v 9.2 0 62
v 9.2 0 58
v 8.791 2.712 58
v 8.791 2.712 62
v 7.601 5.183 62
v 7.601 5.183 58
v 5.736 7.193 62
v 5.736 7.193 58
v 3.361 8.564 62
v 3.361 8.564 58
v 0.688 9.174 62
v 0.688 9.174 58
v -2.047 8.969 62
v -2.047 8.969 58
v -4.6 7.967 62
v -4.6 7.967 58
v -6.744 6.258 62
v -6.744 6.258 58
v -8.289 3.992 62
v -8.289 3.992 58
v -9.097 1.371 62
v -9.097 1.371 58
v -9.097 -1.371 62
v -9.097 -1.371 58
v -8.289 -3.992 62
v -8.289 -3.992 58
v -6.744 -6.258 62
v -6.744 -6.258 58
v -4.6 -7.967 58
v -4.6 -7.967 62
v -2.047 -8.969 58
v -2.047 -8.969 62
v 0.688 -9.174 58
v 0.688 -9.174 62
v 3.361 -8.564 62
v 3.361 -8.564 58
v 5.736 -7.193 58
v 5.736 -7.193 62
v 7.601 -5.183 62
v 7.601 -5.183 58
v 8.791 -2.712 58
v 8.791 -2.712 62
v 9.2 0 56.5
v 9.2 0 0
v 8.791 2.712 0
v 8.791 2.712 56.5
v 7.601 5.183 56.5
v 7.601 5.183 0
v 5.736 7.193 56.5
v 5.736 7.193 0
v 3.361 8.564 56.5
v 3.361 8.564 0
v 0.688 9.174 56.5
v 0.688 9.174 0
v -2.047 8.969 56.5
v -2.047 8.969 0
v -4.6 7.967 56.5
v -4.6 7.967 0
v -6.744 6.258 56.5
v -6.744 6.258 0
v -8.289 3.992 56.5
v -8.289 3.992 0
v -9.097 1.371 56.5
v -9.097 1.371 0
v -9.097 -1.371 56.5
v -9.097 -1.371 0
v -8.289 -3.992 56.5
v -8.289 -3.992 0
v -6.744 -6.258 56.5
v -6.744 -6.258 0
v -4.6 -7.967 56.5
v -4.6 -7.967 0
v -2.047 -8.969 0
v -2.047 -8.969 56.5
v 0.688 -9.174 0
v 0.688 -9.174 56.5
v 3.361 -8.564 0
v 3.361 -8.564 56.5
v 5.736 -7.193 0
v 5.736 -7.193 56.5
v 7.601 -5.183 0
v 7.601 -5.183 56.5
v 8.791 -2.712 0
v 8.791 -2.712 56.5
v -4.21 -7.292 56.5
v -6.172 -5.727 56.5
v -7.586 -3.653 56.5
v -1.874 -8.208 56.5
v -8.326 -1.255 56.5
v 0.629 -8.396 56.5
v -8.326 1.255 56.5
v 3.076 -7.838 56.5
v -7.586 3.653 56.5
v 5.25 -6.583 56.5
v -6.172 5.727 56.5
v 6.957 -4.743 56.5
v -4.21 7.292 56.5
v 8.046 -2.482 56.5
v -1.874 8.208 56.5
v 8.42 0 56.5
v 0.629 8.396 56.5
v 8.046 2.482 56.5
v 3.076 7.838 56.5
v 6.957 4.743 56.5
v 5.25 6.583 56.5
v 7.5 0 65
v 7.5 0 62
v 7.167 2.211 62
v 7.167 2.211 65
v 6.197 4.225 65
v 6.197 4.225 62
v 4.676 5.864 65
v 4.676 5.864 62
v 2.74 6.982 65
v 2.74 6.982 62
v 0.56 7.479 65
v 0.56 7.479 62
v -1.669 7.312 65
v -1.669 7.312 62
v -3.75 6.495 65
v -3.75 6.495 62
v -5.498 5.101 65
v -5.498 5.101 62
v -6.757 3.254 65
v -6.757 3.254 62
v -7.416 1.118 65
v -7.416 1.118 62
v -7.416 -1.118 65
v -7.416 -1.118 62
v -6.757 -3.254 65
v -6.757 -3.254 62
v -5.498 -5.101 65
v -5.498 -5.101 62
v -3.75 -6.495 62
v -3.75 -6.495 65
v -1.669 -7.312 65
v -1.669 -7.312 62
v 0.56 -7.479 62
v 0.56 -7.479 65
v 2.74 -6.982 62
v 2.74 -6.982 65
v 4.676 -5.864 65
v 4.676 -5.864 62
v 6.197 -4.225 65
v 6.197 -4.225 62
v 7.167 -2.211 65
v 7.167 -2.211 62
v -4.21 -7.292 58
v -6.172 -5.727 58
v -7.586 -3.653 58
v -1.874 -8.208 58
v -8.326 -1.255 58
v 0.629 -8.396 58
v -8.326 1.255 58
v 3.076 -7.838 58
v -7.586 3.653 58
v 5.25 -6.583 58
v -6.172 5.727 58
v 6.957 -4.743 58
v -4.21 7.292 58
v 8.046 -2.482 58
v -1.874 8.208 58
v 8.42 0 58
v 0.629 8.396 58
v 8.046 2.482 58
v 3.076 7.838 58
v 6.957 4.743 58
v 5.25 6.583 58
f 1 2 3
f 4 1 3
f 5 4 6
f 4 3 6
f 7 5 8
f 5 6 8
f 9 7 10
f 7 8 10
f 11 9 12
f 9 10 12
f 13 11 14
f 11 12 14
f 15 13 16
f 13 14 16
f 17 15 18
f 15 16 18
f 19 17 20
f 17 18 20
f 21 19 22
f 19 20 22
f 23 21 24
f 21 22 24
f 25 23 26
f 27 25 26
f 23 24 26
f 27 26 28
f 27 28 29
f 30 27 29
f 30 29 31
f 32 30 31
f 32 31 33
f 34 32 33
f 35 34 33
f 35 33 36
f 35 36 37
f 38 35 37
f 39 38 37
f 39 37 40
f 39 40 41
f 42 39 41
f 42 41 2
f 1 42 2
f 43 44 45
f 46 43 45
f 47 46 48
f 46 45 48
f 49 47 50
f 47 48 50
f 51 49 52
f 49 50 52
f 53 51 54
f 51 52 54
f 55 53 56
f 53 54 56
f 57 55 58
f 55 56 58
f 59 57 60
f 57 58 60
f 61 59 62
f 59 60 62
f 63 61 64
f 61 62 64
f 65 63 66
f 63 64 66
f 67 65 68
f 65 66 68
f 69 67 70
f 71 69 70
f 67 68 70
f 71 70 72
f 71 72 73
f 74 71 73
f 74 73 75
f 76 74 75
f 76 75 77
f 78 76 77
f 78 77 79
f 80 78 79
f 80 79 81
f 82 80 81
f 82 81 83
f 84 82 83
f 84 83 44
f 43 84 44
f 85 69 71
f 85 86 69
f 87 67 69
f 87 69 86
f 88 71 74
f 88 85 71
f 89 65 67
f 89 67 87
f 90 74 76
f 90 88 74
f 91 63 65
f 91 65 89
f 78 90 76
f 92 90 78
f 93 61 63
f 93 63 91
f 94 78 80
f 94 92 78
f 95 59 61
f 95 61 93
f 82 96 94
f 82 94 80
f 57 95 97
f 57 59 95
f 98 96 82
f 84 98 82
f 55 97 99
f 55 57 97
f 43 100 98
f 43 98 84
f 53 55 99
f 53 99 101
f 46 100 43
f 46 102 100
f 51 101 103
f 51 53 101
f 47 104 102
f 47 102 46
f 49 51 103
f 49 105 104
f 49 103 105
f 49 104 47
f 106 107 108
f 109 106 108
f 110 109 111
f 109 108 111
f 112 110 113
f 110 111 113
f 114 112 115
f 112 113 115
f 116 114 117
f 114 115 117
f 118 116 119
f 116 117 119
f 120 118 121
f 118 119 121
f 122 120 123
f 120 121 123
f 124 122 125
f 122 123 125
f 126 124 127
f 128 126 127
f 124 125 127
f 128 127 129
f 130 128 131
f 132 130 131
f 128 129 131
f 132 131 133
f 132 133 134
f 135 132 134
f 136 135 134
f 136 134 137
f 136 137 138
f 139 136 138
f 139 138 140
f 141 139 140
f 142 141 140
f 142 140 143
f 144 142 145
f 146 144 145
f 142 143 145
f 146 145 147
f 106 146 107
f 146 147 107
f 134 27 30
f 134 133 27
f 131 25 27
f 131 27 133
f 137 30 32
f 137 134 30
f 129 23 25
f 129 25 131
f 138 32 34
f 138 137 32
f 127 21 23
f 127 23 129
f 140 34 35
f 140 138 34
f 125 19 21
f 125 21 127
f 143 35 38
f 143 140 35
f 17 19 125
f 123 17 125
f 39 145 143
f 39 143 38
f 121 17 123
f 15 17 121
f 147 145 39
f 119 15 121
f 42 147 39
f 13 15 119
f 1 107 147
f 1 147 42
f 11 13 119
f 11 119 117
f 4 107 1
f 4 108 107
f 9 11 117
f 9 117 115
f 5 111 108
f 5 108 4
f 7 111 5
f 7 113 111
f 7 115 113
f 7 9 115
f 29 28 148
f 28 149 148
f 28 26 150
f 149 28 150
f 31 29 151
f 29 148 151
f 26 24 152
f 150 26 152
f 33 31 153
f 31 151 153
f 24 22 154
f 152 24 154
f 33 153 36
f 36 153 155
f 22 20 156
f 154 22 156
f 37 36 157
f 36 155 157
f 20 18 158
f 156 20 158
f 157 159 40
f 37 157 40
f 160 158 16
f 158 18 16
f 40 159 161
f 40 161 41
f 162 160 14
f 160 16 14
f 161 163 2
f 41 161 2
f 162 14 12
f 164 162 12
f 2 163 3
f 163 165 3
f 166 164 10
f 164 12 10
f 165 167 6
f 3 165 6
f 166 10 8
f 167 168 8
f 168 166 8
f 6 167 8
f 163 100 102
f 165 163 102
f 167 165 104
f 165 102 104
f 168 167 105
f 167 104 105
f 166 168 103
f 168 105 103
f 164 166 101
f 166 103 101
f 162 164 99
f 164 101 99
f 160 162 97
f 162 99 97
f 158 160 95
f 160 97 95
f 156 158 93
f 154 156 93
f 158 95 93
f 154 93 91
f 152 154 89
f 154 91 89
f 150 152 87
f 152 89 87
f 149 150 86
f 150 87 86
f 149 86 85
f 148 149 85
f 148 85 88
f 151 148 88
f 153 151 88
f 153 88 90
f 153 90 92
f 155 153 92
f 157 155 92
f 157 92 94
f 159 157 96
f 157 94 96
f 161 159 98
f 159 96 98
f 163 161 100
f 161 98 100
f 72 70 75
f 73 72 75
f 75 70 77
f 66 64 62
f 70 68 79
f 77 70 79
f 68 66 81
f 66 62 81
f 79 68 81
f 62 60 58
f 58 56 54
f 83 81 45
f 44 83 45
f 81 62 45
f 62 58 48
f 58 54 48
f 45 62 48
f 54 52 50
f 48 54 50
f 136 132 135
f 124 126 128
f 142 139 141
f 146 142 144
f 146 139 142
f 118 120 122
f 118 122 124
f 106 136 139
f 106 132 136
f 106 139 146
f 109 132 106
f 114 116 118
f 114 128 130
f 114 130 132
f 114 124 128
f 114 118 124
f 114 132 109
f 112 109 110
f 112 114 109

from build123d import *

# Parameters (mm, degrees)
SKETCH1_R           = 9.2
BOSS_EXTRUDE1_DEPTH = 65
CUT_EXTRUDE2_START  = -3
SKETCH2_R           = 9.2
SKETCH2_R_2         = 7.5
CUT_EXTRUDE2_DEPTH  = 3
CUT_EXTRUDE3_START  = -1.5
SKETCH3_R           = 9.2
SKETCH3_R_2         = 8.419577465
CUT_EXTRUDE3_DEPTH  = 1.5


with BuildPart() as part:
    # Sketch1 → Boss-Extrude1 (new body)
    with BuildSketch(Plane.XY):
        Circle(SKETCH1_R)
    extrude(amount=BOSS_EXTRUDE1_DEPTH)

    # Sketch2 → Cut-Extrude2 (cut)
    with BuildSketch(Plane.XY.offset(65).offset(CUT_EXTRUDE2_START)):
        Circle(SKETCH2_R)
        Circle(SKETCH2_R_2, mode=Mode.SUBTRACT)
    extrude(amount=CUT_EXTRUDE2_DEPTH, mode=Mode.SUBTRACT)

    # Sketch3 → Cut-Extrude3 (cut)
    with BuildSketch(Plane.XY.offset(58).offset(CUT_EXTRUDE3_START)):
        Circle(SKETCH3_R)
        Circle(SKETCH3_R_2, mode=Mode.SUBTRACT)
    extrude(amount=CUT_EXTRUDE3_DEPTH, mode=Mode.SUBTRACT)


solid = part.part
